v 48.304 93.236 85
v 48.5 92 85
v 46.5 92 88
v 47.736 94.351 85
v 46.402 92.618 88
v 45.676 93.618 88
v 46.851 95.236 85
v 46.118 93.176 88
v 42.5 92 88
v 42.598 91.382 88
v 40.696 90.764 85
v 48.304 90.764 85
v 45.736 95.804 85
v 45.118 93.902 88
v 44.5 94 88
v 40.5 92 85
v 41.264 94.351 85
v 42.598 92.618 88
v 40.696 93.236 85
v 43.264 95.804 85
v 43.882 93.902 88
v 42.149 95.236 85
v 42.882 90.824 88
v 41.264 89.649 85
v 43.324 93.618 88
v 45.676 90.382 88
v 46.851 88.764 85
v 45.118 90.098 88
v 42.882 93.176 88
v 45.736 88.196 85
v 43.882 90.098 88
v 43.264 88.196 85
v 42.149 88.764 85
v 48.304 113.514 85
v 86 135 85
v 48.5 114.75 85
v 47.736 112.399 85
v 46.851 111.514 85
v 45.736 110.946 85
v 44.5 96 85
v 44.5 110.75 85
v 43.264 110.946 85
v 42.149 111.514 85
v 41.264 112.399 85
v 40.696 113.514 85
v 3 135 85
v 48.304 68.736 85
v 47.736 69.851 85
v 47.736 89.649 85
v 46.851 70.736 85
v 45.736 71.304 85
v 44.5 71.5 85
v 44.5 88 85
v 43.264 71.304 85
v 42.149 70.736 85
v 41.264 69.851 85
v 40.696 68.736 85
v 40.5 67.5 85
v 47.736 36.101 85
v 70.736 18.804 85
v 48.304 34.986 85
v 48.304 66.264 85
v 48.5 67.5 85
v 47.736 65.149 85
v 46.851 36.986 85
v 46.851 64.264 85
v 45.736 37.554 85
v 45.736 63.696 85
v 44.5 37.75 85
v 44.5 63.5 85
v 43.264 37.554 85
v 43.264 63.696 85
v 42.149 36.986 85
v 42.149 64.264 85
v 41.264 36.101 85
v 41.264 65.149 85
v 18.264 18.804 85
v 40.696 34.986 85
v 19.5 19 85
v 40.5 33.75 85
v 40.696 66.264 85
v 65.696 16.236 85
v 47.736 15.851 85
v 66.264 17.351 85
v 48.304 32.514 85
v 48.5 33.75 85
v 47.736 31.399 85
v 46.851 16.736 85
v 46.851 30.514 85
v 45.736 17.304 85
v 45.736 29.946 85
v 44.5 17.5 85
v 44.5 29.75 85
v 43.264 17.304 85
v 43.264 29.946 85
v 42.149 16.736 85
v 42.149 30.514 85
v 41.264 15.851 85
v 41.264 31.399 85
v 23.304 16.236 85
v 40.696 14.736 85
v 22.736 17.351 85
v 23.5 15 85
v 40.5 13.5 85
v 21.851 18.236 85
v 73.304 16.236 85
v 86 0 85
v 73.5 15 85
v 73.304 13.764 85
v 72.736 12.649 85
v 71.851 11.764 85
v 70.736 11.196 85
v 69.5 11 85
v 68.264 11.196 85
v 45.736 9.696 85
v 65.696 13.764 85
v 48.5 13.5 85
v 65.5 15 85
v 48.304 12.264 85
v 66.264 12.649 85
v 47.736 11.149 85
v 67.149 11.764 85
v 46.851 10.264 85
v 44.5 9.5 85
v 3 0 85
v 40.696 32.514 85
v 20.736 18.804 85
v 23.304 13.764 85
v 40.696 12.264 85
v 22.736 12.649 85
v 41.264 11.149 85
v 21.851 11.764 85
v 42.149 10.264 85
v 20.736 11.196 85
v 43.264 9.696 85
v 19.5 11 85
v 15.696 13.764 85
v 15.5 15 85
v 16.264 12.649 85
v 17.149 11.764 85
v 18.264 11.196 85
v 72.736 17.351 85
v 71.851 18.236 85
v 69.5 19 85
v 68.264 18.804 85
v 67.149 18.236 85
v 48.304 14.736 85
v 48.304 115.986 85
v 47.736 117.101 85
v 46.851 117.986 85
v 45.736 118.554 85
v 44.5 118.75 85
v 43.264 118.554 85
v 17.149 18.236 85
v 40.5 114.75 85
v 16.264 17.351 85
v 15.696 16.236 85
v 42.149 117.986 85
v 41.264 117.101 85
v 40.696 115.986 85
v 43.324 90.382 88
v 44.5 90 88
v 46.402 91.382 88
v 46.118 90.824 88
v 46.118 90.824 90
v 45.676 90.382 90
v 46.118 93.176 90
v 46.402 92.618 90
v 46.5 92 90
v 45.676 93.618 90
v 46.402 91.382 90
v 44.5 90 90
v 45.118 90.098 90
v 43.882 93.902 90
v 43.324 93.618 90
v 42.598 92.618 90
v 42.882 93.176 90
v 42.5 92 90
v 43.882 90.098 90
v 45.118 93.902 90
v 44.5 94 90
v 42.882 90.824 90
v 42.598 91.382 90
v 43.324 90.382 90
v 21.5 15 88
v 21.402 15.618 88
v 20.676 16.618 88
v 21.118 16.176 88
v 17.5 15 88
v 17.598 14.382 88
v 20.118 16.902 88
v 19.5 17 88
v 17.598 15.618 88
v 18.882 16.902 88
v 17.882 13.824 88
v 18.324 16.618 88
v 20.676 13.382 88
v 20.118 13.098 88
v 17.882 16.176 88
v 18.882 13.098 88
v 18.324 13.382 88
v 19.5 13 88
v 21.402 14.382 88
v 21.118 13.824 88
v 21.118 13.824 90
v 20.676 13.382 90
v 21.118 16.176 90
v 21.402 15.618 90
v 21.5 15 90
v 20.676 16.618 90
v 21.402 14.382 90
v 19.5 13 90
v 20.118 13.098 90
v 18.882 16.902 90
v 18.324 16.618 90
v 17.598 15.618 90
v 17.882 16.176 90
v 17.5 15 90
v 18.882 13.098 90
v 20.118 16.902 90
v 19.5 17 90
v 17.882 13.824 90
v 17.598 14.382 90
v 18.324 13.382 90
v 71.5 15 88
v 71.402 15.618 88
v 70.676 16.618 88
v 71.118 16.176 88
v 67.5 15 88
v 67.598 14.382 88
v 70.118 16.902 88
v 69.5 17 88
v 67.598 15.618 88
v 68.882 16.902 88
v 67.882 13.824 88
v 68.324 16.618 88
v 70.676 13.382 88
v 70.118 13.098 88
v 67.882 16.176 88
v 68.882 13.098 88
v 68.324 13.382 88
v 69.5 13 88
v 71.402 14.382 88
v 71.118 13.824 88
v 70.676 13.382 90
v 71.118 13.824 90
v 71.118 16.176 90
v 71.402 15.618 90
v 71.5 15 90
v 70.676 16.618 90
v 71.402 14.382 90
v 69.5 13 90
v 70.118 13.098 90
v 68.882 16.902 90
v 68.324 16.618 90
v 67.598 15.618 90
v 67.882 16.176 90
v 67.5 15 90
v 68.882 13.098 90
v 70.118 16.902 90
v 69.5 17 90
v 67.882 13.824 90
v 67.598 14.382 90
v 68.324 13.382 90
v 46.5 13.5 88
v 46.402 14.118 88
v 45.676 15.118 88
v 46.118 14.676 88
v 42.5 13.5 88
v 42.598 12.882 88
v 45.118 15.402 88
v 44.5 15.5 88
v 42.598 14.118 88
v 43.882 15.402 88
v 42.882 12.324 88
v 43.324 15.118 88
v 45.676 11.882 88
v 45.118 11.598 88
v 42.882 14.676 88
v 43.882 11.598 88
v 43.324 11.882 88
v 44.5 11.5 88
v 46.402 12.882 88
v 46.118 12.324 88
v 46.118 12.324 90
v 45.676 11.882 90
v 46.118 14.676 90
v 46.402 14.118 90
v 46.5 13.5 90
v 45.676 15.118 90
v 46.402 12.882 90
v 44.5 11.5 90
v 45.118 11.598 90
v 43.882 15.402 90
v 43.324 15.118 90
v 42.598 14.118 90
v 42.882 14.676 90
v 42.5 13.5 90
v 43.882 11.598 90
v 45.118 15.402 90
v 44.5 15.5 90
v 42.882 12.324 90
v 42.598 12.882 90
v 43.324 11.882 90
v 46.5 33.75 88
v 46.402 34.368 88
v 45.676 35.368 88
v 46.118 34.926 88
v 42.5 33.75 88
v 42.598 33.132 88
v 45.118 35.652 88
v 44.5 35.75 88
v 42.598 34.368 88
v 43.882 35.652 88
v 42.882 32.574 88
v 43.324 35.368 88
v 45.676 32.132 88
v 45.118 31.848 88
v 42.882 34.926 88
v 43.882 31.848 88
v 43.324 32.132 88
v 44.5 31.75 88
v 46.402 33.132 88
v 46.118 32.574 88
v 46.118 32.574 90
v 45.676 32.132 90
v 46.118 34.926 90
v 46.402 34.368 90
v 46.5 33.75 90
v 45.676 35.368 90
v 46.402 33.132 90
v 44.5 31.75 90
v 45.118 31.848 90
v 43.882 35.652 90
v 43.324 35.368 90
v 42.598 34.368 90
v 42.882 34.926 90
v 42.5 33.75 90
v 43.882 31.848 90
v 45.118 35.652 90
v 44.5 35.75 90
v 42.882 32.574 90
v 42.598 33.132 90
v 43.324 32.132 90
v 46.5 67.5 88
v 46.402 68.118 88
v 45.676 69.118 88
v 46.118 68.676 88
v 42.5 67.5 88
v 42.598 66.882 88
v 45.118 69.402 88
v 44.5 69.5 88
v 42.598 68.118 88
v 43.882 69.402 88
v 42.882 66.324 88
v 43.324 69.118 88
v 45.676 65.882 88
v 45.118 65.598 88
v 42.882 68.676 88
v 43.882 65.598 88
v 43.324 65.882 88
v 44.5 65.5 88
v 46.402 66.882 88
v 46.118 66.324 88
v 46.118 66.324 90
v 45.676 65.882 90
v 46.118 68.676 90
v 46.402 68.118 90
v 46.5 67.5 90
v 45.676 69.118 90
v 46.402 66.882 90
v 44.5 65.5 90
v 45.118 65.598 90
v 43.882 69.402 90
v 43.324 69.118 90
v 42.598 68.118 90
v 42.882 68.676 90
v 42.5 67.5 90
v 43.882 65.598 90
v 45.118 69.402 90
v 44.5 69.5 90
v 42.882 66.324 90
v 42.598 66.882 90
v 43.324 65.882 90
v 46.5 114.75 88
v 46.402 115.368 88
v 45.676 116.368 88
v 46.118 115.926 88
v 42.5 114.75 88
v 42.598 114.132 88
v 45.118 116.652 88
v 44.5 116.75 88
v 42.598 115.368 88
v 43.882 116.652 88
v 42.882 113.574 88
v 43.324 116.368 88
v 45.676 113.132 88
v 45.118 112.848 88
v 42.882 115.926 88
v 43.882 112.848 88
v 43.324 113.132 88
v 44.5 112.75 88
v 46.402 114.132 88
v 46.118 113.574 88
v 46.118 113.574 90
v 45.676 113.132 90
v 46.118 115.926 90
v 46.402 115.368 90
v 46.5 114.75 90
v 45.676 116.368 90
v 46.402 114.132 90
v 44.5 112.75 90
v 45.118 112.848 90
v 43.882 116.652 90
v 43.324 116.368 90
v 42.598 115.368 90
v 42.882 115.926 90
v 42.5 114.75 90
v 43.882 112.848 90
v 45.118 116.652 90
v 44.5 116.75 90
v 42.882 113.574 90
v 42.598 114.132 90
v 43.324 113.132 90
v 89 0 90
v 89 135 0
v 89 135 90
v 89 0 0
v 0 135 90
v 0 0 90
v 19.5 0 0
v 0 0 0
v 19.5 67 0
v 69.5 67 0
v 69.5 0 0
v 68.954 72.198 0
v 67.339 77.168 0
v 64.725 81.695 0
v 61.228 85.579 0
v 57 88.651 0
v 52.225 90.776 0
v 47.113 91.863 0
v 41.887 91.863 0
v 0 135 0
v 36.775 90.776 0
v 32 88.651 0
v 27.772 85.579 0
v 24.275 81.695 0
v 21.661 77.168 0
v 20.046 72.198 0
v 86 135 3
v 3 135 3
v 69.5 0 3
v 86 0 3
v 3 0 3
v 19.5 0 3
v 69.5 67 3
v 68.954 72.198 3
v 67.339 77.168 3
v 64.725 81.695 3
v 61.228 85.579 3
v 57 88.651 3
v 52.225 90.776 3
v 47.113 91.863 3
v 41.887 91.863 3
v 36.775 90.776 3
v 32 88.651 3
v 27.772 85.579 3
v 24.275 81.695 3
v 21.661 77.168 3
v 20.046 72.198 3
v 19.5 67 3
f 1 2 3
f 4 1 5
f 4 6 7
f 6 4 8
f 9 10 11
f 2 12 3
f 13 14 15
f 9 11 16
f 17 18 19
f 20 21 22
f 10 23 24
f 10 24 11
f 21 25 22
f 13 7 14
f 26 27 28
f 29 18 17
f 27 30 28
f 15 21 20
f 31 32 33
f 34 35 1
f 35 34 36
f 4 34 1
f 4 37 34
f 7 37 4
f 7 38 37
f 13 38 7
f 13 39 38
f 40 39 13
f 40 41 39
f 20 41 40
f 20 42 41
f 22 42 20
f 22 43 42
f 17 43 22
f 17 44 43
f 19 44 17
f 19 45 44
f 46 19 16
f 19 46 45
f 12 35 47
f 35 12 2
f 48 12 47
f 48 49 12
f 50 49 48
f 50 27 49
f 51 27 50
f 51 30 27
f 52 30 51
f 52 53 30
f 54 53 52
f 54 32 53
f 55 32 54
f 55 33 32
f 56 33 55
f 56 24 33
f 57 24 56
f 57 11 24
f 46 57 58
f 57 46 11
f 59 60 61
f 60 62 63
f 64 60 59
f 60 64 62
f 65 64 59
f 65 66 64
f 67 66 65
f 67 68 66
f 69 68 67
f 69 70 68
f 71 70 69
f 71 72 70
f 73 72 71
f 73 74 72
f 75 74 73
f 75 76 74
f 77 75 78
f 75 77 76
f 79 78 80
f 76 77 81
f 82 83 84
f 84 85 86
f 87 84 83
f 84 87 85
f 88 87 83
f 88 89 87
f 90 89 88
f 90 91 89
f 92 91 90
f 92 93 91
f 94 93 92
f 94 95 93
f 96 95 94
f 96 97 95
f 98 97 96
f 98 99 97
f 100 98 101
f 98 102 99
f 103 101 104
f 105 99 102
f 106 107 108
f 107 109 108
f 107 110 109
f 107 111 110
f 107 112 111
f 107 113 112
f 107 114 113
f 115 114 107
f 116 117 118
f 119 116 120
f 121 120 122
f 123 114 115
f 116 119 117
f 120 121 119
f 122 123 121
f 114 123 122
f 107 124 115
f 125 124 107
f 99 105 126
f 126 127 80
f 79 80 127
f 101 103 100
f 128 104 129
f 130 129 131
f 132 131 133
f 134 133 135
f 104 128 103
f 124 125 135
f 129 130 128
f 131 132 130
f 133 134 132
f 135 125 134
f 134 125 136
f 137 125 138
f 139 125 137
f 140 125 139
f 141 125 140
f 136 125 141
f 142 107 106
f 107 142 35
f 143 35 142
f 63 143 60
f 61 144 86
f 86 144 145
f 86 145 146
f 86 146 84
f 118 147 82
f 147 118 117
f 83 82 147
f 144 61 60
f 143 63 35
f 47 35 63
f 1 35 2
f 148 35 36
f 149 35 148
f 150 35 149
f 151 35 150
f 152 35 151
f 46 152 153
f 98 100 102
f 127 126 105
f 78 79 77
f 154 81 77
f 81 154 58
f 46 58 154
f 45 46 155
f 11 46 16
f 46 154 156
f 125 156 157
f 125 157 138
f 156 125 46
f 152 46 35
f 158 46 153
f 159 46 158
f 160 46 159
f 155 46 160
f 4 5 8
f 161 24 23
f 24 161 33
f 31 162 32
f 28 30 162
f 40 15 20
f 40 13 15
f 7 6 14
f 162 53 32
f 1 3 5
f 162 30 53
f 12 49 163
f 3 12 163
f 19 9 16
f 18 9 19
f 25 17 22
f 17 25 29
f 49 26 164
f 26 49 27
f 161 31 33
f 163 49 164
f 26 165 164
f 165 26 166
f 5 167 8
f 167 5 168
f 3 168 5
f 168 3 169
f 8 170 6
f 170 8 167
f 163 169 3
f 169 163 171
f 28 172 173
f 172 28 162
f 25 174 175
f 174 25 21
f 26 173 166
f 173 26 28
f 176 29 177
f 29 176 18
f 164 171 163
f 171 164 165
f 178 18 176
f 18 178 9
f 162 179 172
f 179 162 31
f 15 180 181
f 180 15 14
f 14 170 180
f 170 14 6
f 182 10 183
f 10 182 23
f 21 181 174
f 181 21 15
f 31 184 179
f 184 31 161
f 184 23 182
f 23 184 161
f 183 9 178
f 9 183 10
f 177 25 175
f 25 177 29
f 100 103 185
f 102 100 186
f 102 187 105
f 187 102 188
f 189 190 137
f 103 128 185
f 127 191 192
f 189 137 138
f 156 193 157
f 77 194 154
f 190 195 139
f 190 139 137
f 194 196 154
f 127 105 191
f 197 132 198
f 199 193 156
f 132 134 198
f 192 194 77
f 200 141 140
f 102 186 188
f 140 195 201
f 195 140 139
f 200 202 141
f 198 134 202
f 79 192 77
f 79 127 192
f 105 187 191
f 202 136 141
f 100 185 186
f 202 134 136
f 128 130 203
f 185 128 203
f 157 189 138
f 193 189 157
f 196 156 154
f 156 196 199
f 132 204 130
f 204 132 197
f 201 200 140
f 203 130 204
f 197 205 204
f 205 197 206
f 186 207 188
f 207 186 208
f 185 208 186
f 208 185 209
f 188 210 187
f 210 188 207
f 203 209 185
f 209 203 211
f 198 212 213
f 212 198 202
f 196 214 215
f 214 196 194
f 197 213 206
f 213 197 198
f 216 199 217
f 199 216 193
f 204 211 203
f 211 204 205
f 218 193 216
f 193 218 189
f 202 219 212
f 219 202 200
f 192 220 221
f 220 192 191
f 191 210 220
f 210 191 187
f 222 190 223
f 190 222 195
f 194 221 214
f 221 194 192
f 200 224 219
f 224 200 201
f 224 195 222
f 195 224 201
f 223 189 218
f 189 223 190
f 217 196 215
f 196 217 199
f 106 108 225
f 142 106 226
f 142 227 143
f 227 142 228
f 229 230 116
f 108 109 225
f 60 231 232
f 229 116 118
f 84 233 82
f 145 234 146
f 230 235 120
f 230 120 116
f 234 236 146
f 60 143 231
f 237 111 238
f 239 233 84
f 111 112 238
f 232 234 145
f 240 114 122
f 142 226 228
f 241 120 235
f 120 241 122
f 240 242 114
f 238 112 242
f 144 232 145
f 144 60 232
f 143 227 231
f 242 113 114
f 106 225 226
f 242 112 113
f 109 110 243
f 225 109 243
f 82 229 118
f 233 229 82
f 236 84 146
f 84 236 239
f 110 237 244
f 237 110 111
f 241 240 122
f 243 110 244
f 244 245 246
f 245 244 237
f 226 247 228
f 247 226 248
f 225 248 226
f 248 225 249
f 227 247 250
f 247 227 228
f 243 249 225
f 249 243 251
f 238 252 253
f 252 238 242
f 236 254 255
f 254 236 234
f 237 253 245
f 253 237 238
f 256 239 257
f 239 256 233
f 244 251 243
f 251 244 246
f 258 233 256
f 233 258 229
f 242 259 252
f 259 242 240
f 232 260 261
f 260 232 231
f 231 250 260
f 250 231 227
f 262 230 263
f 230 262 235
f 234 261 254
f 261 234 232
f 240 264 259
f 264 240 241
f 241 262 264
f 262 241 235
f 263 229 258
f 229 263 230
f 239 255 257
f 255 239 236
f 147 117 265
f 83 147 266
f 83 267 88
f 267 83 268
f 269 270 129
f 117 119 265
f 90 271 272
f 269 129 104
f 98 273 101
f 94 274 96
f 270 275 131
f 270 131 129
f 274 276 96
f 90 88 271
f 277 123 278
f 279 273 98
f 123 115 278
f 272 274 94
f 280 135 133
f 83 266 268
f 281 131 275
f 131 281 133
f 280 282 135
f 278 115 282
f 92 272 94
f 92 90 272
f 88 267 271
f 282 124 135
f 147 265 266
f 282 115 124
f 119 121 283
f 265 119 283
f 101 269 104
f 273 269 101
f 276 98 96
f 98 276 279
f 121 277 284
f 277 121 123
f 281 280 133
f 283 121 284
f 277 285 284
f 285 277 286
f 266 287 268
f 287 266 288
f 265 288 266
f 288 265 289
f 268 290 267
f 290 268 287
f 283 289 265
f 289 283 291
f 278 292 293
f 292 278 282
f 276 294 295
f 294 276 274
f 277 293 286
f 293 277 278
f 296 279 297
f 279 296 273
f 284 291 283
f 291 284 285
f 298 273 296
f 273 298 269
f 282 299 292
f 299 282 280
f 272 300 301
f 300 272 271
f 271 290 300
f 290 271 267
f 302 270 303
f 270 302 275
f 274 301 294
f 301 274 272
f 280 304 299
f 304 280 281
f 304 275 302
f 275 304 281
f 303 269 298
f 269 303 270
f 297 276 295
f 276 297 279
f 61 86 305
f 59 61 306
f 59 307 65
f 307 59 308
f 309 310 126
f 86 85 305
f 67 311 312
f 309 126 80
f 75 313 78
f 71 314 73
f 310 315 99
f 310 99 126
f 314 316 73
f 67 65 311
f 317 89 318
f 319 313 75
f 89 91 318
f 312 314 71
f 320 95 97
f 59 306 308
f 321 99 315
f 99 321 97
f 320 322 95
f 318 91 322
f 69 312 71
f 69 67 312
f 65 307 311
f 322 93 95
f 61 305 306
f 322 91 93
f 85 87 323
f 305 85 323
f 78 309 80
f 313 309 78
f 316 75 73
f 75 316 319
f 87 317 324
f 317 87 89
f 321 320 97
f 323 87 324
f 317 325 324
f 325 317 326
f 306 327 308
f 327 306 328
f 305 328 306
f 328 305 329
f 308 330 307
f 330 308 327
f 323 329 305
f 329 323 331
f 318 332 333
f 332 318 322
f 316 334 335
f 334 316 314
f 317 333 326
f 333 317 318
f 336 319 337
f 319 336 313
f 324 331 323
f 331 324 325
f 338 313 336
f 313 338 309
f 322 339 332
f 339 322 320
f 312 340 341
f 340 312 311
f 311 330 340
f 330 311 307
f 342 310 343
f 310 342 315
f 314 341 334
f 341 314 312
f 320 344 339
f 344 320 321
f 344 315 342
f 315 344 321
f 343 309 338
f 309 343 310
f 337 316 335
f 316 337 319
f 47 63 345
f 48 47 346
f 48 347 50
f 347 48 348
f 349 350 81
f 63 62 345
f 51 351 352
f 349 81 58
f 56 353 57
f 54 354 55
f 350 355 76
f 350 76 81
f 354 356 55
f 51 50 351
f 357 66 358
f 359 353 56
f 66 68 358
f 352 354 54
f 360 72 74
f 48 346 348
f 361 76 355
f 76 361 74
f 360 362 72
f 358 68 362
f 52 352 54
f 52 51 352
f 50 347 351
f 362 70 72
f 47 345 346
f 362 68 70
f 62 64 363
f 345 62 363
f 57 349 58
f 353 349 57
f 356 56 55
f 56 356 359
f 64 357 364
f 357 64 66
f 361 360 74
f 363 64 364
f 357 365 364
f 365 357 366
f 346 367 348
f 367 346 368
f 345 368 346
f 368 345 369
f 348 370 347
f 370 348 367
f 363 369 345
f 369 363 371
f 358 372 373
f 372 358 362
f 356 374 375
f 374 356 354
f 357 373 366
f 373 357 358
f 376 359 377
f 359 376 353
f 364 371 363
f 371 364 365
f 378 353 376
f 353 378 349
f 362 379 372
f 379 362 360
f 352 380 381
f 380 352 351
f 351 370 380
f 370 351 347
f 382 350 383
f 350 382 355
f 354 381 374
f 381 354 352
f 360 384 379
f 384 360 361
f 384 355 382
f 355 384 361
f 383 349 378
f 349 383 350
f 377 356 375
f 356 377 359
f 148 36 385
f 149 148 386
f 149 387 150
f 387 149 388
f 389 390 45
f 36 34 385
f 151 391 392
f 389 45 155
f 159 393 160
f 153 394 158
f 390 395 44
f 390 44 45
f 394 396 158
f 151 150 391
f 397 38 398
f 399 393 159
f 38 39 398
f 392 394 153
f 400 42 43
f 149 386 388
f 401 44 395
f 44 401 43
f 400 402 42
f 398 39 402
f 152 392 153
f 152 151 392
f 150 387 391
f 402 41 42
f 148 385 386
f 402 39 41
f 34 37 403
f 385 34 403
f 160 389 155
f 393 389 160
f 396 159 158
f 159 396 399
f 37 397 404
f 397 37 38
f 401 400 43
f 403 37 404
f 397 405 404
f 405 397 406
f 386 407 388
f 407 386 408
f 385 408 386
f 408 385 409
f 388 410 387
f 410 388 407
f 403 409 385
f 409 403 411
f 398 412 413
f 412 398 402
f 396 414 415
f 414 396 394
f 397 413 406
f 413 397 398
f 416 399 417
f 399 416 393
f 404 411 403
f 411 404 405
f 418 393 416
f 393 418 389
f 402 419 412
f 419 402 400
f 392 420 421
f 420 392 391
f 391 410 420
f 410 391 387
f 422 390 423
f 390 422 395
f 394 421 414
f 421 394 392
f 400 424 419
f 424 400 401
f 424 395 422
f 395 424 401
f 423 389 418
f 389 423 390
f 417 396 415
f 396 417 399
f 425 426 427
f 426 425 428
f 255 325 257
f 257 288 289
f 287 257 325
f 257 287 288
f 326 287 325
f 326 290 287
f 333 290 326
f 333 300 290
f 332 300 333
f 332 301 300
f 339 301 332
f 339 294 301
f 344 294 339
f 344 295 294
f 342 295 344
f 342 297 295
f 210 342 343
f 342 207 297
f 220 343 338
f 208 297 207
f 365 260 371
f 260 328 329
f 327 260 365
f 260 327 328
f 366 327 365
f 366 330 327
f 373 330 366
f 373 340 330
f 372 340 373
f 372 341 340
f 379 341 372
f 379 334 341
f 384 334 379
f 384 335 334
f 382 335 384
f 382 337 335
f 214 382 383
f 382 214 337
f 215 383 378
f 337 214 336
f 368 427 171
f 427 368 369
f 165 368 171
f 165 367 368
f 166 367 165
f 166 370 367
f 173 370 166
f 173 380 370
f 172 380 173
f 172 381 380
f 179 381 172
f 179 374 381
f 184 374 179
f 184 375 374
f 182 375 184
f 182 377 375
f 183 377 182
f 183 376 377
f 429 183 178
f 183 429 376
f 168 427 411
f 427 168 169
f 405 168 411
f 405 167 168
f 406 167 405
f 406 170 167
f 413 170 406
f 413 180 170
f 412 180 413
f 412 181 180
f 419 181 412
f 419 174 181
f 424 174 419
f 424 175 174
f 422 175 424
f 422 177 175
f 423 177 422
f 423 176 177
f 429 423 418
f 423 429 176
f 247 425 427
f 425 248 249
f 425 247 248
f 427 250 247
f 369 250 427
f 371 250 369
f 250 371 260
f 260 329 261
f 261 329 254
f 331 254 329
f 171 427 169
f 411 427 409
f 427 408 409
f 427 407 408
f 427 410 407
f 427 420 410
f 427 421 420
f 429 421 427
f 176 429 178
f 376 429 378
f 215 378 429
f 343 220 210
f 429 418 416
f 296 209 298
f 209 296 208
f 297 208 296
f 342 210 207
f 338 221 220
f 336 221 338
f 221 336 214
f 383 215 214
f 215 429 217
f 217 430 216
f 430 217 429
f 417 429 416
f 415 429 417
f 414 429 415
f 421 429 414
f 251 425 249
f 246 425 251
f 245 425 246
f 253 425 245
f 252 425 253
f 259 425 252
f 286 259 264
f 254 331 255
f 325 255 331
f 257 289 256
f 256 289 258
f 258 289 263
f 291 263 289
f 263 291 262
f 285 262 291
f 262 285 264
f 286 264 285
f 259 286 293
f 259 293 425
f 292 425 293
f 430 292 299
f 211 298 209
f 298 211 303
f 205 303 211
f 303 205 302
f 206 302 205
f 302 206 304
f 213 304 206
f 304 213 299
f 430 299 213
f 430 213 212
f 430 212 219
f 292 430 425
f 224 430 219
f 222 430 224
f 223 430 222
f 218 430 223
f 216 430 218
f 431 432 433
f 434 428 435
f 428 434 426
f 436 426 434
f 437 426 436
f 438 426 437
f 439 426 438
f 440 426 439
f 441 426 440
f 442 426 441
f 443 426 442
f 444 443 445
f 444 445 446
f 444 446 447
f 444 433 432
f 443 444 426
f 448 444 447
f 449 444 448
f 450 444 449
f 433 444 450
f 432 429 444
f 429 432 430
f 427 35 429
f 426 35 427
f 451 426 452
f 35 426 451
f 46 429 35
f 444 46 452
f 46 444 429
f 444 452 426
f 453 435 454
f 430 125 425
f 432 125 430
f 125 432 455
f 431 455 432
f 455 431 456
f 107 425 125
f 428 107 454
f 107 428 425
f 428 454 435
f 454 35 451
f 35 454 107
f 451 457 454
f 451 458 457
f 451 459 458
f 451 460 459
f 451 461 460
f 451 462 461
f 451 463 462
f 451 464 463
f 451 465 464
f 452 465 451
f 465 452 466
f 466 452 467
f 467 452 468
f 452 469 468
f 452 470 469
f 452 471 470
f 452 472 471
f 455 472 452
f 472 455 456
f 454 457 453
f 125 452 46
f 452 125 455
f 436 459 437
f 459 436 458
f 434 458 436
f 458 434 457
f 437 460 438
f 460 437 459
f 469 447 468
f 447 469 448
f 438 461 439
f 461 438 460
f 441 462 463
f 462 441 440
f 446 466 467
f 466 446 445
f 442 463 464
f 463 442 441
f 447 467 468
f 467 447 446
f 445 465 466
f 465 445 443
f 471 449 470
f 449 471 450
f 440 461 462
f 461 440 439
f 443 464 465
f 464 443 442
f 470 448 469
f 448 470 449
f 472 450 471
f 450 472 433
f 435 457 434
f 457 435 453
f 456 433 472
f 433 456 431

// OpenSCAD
// Ryobi up-side-down holder for tools and batteries




slot_height = 82;  // height of the battery + tool's base with some margin
depth = 135;  // total depth of the mount

slot_width = 83;

cut_out_width = 50;
cut_out_depth = 92;

side_walls_width = 3;

top_width = 5;

bottom_width = 3;


//------

total_height = slot_height + top_width + bottom_width;
total_width = slot_width + 2 * side_walls_width;

screw_z_offset = slot_height + bottom_width;
screw_x_offset = 0.5 * total_width;
screw_x_offset_1 = 0.5 * (total_width - cut_out_width);
screw_x_offset_2 = 0.5 * (total_width + cut_out_width);

middle_screw_depths = [0.10, 0.25, 0.5, 0.85];

front_screw_depth = 15;

module cage() {
  difference() {
      cube([total_width, depth, total_height]);
      translate([side_walls_width, 0, bottom_width]) cube([slot_width, depth, slot_height]);
      translate([0.5*total_width, cut_out_depth-0.5*cut_out_width, 0])
        cylinder(d=cut_out_width, h=bottom_width);
      translate([0.5*(total_width-cut_out_width), 0, 0])
        cube([cut_out_width, cut_out_depth-0.5*cut_out_width, bottom_width]);
      translate([screw_x_offset, cut_out_depth, screw_z_offset]) screw_countersunk();
      translate([screw_x_offset_1, front_screw_depth, screw_z_offset]) screw_countersunk();
      translate([screw_x_offset_2, front_screw_depth, screw_z_offset]) screw_countersunk();
      for (i = middle_screw_depths)
        translate([screw_x_offset, i*depth, screw_z_offset]) screw_countersunk();
  }
}

module screw_countersunk(
        l=20,   //length
        dh = 8,   //head dia
        lh = 3,   //head length
        ds = 4,  //shaft dia
        $fn=20,
        )
{
    union() {
        cylinder(h=lh, r1=dh/2, r2=ds/2);
        cylinder(h=l, d=ds);
    }
}

cage();
//translate([screw_x_offset, cut_out_depth, screw_z_offset]) screw_countersunk();
